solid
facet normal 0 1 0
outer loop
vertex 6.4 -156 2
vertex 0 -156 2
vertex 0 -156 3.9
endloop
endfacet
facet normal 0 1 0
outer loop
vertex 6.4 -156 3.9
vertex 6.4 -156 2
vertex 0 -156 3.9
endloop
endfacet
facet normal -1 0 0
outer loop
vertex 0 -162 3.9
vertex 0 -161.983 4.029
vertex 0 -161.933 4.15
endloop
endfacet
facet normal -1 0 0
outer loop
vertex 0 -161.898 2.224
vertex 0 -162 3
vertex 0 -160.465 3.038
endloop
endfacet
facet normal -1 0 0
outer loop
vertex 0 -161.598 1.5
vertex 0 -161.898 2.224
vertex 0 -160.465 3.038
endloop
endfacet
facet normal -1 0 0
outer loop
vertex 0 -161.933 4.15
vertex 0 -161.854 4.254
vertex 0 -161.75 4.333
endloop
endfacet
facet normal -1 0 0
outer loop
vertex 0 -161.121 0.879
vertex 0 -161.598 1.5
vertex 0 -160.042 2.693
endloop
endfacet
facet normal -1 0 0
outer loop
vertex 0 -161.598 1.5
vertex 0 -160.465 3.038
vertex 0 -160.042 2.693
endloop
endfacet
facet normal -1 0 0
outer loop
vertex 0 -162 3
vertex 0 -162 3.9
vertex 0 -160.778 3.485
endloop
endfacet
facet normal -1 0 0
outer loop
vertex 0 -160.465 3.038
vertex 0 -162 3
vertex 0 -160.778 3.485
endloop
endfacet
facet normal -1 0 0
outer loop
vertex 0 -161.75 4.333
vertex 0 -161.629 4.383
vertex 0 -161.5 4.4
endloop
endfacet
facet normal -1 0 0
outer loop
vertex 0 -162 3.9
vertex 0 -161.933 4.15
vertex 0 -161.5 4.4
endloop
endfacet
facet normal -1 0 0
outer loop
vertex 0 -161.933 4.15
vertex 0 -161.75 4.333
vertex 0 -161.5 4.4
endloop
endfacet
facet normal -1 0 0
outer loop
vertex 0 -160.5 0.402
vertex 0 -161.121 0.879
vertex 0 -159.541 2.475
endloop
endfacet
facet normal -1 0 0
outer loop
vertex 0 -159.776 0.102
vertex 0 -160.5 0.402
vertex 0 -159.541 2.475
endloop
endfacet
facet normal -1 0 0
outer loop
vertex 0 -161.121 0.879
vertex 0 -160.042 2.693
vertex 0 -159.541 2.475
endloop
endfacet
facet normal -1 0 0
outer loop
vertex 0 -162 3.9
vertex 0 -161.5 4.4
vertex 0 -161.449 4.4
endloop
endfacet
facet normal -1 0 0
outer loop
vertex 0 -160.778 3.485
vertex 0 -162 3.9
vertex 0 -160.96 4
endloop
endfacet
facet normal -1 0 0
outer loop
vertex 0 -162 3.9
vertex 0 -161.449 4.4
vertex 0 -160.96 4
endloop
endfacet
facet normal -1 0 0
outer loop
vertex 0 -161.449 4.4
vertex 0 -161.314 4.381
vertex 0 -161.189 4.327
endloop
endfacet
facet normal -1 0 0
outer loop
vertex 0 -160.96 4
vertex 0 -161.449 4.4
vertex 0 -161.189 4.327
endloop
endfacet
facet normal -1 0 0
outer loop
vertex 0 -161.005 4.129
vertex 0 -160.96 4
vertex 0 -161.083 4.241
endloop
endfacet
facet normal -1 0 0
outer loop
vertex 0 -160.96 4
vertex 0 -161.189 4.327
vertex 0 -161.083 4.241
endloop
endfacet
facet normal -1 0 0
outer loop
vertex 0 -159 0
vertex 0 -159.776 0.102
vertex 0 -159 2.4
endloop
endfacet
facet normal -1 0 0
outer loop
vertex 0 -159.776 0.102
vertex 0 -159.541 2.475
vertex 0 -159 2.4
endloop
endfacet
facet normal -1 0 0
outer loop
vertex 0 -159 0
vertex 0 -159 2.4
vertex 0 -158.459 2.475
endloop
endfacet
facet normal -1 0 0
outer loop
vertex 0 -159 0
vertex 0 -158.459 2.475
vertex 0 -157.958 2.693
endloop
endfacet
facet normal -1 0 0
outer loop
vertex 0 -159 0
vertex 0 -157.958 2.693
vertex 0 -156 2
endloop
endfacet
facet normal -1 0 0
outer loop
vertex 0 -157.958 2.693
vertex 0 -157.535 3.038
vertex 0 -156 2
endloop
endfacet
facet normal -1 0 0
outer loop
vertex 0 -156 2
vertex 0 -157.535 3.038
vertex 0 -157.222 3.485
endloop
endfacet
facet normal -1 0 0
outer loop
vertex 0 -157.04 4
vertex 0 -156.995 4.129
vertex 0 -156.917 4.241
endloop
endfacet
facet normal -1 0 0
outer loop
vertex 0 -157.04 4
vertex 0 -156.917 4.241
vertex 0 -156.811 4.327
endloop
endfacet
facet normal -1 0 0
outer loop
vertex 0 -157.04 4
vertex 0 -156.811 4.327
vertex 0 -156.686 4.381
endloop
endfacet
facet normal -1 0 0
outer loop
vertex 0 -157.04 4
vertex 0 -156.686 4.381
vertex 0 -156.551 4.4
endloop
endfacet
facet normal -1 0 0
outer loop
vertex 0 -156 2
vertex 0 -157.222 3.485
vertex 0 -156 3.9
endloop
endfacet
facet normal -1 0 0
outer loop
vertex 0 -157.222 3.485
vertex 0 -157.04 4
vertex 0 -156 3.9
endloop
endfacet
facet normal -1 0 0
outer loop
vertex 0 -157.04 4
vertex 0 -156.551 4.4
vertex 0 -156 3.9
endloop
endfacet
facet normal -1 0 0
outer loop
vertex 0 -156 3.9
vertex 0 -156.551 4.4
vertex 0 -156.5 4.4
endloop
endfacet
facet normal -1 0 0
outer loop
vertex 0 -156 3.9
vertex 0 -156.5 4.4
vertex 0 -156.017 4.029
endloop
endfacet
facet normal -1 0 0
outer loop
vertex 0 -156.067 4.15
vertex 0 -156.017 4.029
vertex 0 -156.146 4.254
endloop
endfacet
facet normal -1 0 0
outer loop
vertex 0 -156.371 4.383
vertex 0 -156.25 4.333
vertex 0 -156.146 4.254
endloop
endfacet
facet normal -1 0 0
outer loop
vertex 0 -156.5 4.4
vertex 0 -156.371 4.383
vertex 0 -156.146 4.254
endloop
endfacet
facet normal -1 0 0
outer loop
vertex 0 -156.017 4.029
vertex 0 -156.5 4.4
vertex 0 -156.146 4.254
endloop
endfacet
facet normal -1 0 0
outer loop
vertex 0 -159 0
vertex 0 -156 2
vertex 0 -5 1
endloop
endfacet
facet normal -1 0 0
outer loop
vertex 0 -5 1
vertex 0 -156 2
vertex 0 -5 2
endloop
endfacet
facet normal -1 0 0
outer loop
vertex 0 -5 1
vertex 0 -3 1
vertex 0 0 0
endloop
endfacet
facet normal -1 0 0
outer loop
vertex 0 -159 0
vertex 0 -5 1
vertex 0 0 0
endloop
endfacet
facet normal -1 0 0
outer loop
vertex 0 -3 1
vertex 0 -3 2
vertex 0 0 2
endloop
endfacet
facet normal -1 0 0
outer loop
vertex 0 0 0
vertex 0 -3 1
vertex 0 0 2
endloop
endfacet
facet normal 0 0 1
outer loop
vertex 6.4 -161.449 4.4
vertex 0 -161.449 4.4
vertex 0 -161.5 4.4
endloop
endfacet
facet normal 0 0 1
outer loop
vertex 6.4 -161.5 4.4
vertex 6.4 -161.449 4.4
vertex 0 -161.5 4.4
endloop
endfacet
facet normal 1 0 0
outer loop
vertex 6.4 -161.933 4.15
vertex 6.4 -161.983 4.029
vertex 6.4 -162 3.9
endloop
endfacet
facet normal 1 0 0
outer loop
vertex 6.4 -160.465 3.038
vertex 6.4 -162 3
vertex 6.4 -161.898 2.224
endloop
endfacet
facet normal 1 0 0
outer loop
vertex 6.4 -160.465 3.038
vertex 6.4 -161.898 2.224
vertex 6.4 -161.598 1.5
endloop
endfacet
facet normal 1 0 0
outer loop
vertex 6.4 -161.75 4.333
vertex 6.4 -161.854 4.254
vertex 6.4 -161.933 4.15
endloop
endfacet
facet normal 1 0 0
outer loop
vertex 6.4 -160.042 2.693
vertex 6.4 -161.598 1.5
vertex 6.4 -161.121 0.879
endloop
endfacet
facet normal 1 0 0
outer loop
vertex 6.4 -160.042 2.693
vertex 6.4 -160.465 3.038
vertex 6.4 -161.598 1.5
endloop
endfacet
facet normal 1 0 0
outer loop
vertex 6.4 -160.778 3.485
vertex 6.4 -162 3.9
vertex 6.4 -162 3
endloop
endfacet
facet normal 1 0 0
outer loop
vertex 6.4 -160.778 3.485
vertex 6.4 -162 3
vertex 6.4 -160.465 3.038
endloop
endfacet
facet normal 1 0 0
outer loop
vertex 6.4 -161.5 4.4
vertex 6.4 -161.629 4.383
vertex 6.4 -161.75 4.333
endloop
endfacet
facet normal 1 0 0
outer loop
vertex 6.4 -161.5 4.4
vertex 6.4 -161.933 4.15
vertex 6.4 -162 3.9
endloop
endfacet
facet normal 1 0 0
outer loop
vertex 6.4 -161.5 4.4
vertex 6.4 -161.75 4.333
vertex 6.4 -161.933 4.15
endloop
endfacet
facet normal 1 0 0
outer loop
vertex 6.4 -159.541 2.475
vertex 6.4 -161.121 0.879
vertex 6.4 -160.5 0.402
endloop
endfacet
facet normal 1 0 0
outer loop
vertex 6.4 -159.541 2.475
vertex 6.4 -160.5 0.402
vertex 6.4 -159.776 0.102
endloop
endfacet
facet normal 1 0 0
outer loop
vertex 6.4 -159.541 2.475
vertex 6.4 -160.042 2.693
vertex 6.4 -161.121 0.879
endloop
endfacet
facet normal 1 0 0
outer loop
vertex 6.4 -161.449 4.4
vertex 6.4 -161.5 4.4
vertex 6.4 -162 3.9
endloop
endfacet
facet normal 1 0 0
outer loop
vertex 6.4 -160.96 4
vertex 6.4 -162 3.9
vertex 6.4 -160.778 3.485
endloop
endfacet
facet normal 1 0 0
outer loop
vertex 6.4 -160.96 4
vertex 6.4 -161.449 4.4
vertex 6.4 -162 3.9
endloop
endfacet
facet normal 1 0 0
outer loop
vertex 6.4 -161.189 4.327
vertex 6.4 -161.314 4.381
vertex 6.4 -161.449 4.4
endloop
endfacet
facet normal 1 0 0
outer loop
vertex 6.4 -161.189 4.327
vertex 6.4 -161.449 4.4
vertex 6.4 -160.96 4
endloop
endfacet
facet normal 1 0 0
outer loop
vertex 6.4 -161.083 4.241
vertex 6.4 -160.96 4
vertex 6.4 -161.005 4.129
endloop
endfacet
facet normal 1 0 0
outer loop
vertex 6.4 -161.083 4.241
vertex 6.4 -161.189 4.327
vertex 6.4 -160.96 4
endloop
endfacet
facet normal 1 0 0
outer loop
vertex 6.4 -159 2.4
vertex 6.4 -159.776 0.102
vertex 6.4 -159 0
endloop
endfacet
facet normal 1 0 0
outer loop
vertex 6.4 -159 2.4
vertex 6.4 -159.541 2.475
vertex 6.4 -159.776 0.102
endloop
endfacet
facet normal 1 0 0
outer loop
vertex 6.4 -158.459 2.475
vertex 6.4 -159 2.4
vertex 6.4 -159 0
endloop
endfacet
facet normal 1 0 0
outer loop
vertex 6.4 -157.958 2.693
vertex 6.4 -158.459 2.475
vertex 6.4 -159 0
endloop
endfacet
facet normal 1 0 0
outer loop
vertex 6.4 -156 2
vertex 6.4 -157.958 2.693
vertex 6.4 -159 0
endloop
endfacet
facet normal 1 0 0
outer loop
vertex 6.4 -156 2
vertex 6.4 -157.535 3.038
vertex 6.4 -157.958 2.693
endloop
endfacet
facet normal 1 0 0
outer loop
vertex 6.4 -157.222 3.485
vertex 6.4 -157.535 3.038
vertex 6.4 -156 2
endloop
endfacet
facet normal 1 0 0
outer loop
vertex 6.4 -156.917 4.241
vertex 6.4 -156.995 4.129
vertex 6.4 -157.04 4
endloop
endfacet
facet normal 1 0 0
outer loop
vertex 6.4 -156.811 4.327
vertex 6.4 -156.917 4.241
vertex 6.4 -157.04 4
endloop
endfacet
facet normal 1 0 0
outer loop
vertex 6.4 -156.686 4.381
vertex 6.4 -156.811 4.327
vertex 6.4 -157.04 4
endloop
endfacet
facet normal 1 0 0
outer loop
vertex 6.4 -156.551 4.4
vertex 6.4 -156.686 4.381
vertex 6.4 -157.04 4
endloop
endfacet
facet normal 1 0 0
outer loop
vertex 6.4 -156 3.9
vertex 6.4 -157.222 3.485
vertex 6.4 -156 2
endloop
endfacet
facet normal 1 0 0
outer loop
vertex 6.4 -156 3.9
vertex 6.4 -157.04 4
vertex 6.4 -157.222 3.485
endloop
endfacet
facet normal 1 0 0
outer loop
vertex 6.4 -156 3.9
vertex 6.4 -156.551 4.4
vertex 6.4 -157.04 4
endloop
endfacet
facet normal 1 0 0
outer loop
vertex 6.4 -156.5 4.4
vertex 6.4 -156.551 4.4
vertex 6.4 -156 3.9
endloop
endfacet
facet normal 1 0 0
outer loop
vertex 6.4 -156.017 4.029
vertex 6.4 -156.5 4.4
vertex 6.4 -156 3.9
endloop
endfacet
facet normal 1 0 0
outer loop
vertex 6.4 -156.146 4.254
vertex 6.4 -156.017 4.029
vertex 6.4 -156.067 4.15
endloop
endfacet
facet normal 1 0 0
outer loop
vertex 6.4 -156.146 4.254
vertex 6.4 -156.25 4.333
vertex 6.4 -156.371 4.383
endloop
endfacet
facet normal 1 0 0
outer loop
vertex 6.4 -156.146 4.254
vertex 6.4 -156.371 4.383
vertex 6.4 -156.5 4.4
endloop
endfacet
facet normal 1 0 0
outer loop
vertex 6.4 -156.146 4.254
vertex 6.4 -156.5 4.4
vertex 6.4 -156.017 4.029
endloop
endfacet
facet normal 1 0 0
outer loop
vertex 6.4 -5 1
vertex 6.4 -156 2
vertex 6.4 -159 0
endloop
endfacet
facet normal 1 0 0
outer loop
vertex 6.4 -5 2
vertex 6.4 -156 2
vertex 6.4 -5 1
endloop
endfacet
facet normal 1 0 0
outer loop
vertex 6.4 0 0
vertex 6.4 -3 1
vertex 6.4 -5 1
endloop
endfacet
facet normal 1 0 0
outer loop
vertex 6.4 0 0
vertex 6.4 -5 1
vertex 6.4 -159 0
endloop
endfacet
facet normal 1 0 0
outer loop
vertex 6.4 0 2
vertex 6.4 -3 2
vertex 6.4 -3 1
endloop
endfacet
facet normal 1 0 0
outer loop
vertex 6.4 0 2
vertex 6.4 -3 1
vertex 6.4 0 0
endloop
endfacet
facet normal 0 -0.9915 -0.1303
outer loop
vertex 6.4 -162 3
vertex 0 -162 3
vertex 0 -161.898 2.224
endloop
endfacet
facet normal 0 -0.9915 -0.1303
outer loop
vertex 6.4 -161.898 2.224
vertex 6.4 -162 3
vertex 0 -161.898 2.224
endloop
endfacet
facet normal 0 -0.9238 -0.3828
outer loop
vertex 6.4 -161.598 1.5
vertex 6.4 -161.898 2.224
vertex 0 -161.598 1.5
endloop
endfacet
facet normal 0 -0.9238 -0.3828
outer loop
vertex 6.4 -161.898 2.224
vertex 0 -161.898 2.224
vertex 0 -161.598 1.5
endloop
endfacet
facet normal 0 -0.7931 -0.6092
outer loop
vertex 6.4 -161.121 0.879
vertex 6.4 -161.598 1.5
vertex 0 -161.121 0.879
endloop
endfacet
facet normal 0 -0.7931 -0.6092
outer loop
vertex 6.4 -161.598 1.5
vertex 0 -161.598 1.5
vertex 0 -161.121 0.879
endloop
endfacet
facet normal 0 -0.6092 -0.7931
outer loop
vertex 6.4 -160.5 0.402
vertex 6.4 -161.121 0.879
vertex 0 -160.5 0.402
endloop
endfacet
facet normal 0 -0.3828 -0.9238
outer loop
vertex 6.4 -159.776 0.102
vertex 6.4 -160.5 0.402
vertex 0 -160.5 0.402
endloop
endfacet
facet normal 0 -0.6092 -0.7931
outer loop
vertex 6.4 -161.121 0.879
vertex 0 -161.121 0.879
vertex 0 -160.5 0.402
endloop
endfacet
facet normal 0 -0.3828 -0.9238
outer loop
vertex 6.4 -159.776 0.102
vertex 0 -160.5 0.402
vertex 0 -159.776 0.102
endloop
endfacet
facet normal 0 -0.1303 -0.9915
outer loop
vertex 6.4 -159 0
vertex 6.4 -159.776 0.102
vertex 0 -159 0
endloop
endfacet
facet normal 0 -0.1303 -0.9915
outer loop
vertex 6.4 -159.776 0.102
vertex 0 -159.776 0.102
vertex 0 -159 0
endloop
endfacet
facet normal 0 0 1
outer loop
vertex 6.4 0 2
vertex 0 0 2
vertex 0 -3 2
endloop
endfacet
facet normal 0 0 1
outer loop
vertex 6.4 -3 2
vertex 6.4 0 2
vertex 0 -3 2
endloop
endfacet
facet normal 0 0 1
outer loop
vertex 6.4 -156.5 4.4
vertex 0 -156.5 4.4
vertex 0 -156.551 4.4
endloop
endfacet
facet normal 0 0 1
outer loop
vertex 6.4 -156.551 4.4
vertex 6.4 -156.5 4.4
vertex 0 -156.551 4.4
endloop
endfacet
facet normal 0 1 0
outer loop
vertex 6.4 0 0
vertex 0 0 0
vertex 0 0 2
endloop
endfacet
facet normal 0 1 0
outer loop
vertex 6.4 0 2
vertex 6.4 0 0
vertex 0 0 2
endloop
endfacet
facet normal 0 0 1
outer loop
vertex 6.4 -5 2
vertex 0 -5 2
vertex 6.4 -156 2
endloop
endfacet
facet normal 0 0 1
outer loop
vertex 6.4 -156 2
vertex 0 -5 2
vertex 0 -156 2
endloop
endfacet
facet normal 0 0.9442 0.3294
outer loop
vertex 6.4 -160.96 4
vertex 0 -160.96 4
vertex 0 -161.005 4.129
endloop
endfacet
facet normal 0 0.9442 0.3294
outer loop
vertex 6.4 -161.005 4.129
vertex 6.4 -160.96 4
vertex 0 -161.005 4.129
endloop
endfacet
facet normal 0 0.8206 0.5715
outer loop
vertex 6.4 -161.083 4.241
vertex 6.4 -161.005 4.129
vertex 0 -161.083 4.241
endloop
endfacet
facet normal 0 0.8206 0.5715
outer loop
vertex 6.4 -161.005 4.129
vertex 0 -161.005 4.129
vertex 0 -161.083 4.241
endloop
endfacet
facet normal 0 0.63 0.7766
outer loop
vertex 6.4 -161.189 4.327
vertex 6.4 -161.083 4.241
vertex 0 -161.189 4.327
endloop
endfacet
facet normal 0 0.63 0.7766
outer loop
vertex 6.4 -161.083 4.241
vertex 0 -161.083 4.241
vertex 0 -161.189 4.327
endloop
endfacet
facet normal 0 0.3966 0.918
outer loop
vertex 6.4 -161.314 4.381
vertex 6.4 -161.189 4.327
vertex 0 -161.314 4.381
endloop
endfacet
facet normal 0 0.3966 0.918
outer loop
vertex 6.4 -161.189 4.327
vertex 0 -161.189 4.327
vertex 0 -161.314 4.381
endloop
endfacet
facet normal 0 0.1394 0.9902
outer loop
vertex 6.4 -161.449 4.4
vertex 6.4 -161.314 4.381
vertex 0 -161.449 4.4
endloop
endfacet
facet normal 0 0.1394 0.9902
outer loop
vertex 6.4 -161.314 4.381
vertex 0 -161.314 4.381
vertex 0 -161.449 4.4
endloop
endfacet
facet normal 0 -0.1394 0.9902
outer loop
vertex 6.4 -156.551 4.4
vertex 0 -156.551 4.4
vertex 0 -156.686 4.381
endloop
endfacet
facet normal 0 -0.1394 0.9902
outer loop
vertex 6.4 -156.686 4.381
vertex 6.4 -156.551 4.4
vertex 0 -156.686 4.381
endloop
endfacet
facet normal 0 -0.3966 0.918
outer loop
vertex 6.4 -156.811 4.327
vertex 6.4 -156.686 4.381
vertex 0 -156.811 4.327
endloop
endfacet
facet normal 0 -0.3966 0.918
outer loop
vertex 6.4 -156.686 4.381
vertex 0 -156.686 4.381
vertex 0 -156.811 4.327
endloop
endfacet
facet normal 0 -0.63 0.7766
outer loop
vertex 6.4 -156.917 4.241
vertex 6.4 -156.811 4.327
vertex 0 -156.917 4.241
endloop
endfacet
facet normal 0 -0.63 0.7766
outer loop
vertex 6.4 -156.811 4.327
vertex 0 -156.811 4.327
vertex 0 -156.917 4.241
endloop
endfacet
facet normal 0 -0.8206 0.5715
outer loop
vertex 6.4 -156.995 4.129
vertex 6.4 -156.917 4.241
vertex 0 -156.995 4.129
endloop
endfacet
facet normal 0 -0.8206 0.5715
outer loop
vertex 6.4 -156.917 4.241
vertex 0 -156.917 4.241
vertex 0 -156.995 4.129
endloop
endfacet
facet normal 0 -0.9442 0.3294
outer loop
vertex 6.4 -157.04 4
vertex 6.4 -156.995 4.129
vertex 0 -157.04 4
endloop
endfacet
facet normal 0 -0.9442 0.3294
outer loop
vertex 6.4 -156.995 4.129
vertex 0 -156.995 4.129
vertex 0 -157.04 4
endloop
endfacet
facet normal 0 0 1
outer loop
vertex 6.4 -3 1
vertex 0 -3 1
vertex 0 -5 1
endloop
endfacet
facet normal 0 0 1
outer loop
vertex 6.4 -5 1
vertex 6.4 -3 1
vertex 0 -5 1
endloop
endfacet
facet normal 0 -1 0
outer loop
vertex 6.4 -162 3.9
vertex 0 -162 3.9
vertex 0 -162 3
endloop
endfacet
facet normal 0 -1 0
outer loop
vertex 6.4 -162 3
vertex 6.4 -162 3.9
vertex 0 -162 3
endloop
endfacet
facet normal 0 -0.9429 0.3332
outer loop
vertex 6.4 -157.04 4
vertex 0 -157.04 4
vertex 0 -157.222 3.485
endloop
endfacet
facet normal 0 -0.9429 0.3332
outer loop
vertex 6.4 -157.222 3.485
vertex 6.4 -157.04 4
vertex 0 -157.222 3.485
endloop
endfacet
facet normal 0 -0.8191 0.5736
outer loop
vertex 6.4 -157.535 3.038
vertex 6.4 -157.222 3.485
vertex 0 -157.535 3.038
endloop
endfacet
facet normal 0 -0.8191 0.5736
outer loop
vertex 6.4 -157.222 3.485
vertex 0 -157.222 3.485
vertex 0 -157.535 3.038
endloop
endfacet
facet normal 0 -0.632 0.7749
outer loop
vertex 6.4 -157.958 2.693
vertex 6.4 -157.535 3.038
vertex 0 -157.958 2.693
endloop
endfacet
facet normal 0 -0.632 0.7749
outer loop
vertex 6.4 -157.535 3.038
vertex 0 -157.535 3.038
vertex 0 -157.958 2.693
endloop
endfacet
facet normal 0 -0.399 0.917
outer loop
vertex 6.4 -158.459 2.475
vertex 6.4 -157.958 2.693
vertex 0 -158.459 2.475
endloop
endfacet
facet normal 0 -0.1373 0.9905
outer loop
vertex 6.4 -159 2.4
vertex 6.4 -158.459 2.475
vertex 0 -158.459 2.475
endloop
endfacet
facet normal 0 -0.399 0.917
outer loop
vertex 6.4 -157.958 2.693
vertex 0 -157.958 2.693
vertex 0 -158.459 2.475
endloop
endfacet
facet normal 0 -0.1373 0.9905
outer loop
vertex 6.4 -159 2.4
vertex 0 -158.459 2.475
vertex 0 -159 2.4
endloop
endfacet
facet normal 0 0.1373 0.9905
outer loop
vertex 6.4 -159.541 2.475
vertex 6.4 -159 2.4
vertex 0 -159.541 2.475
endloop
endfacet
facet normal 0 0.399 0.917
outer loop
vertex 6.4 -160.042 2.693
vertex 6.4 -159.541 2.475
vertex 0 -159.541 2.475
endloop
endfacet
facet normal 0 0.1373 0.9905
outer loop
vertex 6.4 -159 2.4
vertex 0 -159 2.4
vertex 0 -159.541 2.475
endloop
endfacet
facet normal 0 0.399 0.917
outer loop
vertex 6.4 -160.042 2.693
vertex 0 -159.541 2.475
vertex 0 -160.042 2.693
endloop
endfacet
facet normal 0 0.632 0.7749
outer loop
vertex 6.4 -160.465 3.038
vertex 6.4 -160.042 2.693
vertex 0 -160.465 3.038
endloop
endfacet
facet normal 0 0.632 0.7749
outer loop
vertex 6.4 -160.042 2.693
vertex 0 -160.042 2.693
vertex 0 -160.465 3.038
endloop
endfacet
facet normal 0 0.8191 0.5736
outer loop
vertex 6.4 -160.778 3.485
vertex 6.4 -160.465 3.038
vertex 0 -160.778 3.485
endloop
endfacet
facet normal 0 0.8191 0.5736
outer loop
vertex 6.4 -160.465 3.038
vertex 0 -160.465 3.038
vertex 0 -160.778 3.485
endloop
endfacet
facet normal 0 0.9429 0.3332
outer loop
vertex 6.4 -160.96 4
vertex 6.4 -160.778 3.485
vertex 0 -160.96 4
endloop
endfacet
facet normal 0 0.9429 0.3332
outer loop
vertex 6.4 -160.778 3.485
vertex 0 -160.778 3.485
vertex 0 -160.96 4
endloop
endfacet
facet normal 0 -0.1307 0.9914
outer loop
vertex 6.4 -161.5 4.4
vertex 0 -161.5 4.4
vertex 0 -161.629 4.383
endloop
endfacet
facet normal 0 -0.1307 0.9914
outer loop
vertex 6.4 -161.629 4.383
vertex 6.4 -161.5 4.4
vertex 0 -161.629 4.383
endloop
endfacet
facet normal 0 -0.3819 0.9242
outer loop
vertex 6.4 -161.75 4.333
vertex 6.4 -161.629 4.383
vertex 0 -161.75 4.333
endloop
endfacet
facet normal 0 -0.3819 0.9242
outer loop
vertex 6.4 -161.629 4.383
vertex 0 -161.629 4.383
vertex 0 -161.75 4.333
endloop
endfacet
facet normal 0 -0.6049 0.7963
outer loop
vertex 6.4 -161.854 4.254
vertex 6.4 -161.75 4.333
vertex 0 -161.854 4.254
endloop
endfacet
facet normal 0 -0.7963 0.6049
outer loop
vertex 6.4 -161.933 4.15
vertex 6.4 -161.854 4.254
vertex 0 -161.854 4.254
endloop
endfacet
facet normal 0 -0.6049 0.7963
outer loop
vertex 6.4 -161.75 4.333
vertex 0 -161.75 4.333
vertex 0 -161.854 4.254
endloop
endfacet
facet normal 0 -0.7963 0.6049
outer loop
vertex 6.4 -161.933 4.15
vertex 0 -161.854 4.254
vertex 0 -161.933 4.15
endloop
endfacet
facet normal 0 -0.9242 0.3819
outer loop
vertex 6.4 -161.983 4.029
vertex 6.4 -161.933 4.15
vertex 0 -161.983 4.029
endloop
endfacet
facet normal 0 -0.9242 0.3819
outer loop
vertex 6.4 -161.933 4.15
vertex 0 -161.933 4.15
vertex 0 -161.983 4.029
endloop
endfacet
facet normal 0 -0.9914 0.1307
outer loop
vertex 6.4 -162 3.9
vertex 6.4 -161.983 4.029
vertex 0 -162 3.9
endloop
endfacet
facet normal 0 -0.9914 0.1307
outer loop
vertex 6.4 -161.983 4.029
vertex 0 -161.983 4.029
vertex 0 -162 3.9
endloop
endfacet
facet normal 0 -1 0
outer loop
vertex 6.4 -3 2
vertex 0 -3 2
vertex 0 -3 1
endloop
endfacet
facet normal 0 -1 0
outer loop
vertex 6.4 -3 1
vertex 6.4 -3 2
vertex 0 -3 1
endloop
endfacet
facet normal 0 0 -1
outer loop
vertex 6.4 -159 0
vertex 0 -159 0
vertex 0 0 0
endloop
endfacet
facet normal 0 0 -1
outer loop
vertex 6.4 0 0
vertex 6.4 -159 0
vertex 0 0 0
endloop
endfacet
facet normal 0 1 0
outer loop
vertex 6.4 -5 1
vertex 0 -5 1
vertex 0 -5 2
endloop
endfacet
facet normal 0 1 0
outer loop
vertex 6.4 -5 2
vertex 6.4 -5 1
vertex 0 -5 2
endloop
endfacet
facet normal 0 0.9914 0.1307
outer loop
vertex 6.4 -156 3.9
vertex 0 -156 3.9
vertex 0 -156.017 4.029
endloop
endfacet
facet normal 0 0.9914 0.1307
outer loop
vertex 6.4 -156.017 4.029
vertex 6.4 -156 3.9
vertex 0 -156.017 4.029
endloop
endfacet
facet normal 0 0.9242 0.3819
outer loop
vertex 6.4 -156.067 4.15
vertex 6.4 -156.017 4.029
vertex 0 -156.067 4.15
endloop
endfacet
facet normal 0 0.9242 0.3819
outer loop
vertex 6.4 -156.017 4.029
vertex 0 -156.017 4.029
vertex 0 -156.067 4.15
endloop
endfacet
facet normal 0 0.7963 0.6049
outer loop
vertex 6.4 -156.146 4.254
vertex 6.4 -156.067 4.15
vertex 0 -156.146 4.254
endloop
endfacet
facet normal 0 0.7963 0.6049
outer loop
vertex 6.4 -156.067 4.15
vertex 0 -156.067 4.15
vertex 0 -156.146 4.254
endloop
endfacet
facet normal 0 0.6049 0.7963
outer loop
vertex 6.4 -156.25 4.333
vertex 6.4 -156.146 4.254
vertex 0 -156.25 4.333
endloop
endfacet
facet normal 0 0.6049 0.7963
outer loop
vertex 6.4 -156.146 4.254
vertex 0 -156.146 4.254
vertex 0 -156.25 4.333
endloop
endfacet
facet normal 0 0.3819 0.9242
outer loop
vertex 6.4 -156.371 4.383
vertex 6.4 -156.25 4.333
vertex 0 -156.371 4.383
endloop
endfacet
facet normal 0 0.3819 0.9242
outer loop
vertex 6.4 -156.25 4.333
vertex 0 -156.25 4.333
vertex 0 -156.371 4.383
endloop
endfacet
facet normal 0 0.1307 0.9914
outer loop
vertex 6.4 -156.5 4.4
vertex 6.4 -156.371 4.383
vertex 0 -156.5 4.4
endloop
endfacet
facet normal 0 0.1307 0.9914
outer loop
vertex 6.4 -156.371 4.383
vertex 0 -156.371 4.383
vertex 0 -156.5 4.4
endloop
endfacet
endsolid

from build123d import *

# Parameters (mm, degrees)
F1_DEPTH = 6.4


# Not quite as in the source:
# - a feature names something its author has since deleted; it is built from what else it names


with BuildPart() as f1:
    # F0 (on Right) → F1 (new body)
    with BuildSketch(Plane.YZ):
        with BuildLine():
            Line((-159, 0), (0, 0))
            Line((0, 0), (0, 2))
            Line((0, 2), (-3, 2))
            Line((-3, 2), (-3, 1))
            Line((-3, 1), (-5, 1))
            Line((-5, 1), (-5, 2))
            Line((-5, 2), (-156, 2))
            Line((-156, 2), (-156, 3.9))
            ThreePointArc((-156, 3.9), (-156.1464466094, 4.2535533906), (-156.5, 4.4))
            Line((-156.5, 4.4), (-156.5505102572, 4.4))
            ThreePointArc((-156.5505102572, 4.4), (-156.8667380232, 4.2872983346), (-157.0404082058, 4))
            ThreePointArc((-157.0404082058, 4), (-159, 2.4), (-160.9595917942, 4))
            ThreePointArc((-160.9595917942, 4), (-161.1332619768, 4.2872983346), (-161.4494897428, 4.4))
            Line((-161.4494897428, 4.4), (-161.5, 4.4))
            ThreePointArc((-161.5, 4.4), (-161.8535533906, 4.2535533906), (-162, 3.9))
            Line((-162, 3.9), (-162, 3))
            ThreePointArc((-162, 3), (-161.1213203436, 0.8786796564), (-159, 0))
        make_face()
    extrude(amount=F1_DEPTH)


solid = f1.part
